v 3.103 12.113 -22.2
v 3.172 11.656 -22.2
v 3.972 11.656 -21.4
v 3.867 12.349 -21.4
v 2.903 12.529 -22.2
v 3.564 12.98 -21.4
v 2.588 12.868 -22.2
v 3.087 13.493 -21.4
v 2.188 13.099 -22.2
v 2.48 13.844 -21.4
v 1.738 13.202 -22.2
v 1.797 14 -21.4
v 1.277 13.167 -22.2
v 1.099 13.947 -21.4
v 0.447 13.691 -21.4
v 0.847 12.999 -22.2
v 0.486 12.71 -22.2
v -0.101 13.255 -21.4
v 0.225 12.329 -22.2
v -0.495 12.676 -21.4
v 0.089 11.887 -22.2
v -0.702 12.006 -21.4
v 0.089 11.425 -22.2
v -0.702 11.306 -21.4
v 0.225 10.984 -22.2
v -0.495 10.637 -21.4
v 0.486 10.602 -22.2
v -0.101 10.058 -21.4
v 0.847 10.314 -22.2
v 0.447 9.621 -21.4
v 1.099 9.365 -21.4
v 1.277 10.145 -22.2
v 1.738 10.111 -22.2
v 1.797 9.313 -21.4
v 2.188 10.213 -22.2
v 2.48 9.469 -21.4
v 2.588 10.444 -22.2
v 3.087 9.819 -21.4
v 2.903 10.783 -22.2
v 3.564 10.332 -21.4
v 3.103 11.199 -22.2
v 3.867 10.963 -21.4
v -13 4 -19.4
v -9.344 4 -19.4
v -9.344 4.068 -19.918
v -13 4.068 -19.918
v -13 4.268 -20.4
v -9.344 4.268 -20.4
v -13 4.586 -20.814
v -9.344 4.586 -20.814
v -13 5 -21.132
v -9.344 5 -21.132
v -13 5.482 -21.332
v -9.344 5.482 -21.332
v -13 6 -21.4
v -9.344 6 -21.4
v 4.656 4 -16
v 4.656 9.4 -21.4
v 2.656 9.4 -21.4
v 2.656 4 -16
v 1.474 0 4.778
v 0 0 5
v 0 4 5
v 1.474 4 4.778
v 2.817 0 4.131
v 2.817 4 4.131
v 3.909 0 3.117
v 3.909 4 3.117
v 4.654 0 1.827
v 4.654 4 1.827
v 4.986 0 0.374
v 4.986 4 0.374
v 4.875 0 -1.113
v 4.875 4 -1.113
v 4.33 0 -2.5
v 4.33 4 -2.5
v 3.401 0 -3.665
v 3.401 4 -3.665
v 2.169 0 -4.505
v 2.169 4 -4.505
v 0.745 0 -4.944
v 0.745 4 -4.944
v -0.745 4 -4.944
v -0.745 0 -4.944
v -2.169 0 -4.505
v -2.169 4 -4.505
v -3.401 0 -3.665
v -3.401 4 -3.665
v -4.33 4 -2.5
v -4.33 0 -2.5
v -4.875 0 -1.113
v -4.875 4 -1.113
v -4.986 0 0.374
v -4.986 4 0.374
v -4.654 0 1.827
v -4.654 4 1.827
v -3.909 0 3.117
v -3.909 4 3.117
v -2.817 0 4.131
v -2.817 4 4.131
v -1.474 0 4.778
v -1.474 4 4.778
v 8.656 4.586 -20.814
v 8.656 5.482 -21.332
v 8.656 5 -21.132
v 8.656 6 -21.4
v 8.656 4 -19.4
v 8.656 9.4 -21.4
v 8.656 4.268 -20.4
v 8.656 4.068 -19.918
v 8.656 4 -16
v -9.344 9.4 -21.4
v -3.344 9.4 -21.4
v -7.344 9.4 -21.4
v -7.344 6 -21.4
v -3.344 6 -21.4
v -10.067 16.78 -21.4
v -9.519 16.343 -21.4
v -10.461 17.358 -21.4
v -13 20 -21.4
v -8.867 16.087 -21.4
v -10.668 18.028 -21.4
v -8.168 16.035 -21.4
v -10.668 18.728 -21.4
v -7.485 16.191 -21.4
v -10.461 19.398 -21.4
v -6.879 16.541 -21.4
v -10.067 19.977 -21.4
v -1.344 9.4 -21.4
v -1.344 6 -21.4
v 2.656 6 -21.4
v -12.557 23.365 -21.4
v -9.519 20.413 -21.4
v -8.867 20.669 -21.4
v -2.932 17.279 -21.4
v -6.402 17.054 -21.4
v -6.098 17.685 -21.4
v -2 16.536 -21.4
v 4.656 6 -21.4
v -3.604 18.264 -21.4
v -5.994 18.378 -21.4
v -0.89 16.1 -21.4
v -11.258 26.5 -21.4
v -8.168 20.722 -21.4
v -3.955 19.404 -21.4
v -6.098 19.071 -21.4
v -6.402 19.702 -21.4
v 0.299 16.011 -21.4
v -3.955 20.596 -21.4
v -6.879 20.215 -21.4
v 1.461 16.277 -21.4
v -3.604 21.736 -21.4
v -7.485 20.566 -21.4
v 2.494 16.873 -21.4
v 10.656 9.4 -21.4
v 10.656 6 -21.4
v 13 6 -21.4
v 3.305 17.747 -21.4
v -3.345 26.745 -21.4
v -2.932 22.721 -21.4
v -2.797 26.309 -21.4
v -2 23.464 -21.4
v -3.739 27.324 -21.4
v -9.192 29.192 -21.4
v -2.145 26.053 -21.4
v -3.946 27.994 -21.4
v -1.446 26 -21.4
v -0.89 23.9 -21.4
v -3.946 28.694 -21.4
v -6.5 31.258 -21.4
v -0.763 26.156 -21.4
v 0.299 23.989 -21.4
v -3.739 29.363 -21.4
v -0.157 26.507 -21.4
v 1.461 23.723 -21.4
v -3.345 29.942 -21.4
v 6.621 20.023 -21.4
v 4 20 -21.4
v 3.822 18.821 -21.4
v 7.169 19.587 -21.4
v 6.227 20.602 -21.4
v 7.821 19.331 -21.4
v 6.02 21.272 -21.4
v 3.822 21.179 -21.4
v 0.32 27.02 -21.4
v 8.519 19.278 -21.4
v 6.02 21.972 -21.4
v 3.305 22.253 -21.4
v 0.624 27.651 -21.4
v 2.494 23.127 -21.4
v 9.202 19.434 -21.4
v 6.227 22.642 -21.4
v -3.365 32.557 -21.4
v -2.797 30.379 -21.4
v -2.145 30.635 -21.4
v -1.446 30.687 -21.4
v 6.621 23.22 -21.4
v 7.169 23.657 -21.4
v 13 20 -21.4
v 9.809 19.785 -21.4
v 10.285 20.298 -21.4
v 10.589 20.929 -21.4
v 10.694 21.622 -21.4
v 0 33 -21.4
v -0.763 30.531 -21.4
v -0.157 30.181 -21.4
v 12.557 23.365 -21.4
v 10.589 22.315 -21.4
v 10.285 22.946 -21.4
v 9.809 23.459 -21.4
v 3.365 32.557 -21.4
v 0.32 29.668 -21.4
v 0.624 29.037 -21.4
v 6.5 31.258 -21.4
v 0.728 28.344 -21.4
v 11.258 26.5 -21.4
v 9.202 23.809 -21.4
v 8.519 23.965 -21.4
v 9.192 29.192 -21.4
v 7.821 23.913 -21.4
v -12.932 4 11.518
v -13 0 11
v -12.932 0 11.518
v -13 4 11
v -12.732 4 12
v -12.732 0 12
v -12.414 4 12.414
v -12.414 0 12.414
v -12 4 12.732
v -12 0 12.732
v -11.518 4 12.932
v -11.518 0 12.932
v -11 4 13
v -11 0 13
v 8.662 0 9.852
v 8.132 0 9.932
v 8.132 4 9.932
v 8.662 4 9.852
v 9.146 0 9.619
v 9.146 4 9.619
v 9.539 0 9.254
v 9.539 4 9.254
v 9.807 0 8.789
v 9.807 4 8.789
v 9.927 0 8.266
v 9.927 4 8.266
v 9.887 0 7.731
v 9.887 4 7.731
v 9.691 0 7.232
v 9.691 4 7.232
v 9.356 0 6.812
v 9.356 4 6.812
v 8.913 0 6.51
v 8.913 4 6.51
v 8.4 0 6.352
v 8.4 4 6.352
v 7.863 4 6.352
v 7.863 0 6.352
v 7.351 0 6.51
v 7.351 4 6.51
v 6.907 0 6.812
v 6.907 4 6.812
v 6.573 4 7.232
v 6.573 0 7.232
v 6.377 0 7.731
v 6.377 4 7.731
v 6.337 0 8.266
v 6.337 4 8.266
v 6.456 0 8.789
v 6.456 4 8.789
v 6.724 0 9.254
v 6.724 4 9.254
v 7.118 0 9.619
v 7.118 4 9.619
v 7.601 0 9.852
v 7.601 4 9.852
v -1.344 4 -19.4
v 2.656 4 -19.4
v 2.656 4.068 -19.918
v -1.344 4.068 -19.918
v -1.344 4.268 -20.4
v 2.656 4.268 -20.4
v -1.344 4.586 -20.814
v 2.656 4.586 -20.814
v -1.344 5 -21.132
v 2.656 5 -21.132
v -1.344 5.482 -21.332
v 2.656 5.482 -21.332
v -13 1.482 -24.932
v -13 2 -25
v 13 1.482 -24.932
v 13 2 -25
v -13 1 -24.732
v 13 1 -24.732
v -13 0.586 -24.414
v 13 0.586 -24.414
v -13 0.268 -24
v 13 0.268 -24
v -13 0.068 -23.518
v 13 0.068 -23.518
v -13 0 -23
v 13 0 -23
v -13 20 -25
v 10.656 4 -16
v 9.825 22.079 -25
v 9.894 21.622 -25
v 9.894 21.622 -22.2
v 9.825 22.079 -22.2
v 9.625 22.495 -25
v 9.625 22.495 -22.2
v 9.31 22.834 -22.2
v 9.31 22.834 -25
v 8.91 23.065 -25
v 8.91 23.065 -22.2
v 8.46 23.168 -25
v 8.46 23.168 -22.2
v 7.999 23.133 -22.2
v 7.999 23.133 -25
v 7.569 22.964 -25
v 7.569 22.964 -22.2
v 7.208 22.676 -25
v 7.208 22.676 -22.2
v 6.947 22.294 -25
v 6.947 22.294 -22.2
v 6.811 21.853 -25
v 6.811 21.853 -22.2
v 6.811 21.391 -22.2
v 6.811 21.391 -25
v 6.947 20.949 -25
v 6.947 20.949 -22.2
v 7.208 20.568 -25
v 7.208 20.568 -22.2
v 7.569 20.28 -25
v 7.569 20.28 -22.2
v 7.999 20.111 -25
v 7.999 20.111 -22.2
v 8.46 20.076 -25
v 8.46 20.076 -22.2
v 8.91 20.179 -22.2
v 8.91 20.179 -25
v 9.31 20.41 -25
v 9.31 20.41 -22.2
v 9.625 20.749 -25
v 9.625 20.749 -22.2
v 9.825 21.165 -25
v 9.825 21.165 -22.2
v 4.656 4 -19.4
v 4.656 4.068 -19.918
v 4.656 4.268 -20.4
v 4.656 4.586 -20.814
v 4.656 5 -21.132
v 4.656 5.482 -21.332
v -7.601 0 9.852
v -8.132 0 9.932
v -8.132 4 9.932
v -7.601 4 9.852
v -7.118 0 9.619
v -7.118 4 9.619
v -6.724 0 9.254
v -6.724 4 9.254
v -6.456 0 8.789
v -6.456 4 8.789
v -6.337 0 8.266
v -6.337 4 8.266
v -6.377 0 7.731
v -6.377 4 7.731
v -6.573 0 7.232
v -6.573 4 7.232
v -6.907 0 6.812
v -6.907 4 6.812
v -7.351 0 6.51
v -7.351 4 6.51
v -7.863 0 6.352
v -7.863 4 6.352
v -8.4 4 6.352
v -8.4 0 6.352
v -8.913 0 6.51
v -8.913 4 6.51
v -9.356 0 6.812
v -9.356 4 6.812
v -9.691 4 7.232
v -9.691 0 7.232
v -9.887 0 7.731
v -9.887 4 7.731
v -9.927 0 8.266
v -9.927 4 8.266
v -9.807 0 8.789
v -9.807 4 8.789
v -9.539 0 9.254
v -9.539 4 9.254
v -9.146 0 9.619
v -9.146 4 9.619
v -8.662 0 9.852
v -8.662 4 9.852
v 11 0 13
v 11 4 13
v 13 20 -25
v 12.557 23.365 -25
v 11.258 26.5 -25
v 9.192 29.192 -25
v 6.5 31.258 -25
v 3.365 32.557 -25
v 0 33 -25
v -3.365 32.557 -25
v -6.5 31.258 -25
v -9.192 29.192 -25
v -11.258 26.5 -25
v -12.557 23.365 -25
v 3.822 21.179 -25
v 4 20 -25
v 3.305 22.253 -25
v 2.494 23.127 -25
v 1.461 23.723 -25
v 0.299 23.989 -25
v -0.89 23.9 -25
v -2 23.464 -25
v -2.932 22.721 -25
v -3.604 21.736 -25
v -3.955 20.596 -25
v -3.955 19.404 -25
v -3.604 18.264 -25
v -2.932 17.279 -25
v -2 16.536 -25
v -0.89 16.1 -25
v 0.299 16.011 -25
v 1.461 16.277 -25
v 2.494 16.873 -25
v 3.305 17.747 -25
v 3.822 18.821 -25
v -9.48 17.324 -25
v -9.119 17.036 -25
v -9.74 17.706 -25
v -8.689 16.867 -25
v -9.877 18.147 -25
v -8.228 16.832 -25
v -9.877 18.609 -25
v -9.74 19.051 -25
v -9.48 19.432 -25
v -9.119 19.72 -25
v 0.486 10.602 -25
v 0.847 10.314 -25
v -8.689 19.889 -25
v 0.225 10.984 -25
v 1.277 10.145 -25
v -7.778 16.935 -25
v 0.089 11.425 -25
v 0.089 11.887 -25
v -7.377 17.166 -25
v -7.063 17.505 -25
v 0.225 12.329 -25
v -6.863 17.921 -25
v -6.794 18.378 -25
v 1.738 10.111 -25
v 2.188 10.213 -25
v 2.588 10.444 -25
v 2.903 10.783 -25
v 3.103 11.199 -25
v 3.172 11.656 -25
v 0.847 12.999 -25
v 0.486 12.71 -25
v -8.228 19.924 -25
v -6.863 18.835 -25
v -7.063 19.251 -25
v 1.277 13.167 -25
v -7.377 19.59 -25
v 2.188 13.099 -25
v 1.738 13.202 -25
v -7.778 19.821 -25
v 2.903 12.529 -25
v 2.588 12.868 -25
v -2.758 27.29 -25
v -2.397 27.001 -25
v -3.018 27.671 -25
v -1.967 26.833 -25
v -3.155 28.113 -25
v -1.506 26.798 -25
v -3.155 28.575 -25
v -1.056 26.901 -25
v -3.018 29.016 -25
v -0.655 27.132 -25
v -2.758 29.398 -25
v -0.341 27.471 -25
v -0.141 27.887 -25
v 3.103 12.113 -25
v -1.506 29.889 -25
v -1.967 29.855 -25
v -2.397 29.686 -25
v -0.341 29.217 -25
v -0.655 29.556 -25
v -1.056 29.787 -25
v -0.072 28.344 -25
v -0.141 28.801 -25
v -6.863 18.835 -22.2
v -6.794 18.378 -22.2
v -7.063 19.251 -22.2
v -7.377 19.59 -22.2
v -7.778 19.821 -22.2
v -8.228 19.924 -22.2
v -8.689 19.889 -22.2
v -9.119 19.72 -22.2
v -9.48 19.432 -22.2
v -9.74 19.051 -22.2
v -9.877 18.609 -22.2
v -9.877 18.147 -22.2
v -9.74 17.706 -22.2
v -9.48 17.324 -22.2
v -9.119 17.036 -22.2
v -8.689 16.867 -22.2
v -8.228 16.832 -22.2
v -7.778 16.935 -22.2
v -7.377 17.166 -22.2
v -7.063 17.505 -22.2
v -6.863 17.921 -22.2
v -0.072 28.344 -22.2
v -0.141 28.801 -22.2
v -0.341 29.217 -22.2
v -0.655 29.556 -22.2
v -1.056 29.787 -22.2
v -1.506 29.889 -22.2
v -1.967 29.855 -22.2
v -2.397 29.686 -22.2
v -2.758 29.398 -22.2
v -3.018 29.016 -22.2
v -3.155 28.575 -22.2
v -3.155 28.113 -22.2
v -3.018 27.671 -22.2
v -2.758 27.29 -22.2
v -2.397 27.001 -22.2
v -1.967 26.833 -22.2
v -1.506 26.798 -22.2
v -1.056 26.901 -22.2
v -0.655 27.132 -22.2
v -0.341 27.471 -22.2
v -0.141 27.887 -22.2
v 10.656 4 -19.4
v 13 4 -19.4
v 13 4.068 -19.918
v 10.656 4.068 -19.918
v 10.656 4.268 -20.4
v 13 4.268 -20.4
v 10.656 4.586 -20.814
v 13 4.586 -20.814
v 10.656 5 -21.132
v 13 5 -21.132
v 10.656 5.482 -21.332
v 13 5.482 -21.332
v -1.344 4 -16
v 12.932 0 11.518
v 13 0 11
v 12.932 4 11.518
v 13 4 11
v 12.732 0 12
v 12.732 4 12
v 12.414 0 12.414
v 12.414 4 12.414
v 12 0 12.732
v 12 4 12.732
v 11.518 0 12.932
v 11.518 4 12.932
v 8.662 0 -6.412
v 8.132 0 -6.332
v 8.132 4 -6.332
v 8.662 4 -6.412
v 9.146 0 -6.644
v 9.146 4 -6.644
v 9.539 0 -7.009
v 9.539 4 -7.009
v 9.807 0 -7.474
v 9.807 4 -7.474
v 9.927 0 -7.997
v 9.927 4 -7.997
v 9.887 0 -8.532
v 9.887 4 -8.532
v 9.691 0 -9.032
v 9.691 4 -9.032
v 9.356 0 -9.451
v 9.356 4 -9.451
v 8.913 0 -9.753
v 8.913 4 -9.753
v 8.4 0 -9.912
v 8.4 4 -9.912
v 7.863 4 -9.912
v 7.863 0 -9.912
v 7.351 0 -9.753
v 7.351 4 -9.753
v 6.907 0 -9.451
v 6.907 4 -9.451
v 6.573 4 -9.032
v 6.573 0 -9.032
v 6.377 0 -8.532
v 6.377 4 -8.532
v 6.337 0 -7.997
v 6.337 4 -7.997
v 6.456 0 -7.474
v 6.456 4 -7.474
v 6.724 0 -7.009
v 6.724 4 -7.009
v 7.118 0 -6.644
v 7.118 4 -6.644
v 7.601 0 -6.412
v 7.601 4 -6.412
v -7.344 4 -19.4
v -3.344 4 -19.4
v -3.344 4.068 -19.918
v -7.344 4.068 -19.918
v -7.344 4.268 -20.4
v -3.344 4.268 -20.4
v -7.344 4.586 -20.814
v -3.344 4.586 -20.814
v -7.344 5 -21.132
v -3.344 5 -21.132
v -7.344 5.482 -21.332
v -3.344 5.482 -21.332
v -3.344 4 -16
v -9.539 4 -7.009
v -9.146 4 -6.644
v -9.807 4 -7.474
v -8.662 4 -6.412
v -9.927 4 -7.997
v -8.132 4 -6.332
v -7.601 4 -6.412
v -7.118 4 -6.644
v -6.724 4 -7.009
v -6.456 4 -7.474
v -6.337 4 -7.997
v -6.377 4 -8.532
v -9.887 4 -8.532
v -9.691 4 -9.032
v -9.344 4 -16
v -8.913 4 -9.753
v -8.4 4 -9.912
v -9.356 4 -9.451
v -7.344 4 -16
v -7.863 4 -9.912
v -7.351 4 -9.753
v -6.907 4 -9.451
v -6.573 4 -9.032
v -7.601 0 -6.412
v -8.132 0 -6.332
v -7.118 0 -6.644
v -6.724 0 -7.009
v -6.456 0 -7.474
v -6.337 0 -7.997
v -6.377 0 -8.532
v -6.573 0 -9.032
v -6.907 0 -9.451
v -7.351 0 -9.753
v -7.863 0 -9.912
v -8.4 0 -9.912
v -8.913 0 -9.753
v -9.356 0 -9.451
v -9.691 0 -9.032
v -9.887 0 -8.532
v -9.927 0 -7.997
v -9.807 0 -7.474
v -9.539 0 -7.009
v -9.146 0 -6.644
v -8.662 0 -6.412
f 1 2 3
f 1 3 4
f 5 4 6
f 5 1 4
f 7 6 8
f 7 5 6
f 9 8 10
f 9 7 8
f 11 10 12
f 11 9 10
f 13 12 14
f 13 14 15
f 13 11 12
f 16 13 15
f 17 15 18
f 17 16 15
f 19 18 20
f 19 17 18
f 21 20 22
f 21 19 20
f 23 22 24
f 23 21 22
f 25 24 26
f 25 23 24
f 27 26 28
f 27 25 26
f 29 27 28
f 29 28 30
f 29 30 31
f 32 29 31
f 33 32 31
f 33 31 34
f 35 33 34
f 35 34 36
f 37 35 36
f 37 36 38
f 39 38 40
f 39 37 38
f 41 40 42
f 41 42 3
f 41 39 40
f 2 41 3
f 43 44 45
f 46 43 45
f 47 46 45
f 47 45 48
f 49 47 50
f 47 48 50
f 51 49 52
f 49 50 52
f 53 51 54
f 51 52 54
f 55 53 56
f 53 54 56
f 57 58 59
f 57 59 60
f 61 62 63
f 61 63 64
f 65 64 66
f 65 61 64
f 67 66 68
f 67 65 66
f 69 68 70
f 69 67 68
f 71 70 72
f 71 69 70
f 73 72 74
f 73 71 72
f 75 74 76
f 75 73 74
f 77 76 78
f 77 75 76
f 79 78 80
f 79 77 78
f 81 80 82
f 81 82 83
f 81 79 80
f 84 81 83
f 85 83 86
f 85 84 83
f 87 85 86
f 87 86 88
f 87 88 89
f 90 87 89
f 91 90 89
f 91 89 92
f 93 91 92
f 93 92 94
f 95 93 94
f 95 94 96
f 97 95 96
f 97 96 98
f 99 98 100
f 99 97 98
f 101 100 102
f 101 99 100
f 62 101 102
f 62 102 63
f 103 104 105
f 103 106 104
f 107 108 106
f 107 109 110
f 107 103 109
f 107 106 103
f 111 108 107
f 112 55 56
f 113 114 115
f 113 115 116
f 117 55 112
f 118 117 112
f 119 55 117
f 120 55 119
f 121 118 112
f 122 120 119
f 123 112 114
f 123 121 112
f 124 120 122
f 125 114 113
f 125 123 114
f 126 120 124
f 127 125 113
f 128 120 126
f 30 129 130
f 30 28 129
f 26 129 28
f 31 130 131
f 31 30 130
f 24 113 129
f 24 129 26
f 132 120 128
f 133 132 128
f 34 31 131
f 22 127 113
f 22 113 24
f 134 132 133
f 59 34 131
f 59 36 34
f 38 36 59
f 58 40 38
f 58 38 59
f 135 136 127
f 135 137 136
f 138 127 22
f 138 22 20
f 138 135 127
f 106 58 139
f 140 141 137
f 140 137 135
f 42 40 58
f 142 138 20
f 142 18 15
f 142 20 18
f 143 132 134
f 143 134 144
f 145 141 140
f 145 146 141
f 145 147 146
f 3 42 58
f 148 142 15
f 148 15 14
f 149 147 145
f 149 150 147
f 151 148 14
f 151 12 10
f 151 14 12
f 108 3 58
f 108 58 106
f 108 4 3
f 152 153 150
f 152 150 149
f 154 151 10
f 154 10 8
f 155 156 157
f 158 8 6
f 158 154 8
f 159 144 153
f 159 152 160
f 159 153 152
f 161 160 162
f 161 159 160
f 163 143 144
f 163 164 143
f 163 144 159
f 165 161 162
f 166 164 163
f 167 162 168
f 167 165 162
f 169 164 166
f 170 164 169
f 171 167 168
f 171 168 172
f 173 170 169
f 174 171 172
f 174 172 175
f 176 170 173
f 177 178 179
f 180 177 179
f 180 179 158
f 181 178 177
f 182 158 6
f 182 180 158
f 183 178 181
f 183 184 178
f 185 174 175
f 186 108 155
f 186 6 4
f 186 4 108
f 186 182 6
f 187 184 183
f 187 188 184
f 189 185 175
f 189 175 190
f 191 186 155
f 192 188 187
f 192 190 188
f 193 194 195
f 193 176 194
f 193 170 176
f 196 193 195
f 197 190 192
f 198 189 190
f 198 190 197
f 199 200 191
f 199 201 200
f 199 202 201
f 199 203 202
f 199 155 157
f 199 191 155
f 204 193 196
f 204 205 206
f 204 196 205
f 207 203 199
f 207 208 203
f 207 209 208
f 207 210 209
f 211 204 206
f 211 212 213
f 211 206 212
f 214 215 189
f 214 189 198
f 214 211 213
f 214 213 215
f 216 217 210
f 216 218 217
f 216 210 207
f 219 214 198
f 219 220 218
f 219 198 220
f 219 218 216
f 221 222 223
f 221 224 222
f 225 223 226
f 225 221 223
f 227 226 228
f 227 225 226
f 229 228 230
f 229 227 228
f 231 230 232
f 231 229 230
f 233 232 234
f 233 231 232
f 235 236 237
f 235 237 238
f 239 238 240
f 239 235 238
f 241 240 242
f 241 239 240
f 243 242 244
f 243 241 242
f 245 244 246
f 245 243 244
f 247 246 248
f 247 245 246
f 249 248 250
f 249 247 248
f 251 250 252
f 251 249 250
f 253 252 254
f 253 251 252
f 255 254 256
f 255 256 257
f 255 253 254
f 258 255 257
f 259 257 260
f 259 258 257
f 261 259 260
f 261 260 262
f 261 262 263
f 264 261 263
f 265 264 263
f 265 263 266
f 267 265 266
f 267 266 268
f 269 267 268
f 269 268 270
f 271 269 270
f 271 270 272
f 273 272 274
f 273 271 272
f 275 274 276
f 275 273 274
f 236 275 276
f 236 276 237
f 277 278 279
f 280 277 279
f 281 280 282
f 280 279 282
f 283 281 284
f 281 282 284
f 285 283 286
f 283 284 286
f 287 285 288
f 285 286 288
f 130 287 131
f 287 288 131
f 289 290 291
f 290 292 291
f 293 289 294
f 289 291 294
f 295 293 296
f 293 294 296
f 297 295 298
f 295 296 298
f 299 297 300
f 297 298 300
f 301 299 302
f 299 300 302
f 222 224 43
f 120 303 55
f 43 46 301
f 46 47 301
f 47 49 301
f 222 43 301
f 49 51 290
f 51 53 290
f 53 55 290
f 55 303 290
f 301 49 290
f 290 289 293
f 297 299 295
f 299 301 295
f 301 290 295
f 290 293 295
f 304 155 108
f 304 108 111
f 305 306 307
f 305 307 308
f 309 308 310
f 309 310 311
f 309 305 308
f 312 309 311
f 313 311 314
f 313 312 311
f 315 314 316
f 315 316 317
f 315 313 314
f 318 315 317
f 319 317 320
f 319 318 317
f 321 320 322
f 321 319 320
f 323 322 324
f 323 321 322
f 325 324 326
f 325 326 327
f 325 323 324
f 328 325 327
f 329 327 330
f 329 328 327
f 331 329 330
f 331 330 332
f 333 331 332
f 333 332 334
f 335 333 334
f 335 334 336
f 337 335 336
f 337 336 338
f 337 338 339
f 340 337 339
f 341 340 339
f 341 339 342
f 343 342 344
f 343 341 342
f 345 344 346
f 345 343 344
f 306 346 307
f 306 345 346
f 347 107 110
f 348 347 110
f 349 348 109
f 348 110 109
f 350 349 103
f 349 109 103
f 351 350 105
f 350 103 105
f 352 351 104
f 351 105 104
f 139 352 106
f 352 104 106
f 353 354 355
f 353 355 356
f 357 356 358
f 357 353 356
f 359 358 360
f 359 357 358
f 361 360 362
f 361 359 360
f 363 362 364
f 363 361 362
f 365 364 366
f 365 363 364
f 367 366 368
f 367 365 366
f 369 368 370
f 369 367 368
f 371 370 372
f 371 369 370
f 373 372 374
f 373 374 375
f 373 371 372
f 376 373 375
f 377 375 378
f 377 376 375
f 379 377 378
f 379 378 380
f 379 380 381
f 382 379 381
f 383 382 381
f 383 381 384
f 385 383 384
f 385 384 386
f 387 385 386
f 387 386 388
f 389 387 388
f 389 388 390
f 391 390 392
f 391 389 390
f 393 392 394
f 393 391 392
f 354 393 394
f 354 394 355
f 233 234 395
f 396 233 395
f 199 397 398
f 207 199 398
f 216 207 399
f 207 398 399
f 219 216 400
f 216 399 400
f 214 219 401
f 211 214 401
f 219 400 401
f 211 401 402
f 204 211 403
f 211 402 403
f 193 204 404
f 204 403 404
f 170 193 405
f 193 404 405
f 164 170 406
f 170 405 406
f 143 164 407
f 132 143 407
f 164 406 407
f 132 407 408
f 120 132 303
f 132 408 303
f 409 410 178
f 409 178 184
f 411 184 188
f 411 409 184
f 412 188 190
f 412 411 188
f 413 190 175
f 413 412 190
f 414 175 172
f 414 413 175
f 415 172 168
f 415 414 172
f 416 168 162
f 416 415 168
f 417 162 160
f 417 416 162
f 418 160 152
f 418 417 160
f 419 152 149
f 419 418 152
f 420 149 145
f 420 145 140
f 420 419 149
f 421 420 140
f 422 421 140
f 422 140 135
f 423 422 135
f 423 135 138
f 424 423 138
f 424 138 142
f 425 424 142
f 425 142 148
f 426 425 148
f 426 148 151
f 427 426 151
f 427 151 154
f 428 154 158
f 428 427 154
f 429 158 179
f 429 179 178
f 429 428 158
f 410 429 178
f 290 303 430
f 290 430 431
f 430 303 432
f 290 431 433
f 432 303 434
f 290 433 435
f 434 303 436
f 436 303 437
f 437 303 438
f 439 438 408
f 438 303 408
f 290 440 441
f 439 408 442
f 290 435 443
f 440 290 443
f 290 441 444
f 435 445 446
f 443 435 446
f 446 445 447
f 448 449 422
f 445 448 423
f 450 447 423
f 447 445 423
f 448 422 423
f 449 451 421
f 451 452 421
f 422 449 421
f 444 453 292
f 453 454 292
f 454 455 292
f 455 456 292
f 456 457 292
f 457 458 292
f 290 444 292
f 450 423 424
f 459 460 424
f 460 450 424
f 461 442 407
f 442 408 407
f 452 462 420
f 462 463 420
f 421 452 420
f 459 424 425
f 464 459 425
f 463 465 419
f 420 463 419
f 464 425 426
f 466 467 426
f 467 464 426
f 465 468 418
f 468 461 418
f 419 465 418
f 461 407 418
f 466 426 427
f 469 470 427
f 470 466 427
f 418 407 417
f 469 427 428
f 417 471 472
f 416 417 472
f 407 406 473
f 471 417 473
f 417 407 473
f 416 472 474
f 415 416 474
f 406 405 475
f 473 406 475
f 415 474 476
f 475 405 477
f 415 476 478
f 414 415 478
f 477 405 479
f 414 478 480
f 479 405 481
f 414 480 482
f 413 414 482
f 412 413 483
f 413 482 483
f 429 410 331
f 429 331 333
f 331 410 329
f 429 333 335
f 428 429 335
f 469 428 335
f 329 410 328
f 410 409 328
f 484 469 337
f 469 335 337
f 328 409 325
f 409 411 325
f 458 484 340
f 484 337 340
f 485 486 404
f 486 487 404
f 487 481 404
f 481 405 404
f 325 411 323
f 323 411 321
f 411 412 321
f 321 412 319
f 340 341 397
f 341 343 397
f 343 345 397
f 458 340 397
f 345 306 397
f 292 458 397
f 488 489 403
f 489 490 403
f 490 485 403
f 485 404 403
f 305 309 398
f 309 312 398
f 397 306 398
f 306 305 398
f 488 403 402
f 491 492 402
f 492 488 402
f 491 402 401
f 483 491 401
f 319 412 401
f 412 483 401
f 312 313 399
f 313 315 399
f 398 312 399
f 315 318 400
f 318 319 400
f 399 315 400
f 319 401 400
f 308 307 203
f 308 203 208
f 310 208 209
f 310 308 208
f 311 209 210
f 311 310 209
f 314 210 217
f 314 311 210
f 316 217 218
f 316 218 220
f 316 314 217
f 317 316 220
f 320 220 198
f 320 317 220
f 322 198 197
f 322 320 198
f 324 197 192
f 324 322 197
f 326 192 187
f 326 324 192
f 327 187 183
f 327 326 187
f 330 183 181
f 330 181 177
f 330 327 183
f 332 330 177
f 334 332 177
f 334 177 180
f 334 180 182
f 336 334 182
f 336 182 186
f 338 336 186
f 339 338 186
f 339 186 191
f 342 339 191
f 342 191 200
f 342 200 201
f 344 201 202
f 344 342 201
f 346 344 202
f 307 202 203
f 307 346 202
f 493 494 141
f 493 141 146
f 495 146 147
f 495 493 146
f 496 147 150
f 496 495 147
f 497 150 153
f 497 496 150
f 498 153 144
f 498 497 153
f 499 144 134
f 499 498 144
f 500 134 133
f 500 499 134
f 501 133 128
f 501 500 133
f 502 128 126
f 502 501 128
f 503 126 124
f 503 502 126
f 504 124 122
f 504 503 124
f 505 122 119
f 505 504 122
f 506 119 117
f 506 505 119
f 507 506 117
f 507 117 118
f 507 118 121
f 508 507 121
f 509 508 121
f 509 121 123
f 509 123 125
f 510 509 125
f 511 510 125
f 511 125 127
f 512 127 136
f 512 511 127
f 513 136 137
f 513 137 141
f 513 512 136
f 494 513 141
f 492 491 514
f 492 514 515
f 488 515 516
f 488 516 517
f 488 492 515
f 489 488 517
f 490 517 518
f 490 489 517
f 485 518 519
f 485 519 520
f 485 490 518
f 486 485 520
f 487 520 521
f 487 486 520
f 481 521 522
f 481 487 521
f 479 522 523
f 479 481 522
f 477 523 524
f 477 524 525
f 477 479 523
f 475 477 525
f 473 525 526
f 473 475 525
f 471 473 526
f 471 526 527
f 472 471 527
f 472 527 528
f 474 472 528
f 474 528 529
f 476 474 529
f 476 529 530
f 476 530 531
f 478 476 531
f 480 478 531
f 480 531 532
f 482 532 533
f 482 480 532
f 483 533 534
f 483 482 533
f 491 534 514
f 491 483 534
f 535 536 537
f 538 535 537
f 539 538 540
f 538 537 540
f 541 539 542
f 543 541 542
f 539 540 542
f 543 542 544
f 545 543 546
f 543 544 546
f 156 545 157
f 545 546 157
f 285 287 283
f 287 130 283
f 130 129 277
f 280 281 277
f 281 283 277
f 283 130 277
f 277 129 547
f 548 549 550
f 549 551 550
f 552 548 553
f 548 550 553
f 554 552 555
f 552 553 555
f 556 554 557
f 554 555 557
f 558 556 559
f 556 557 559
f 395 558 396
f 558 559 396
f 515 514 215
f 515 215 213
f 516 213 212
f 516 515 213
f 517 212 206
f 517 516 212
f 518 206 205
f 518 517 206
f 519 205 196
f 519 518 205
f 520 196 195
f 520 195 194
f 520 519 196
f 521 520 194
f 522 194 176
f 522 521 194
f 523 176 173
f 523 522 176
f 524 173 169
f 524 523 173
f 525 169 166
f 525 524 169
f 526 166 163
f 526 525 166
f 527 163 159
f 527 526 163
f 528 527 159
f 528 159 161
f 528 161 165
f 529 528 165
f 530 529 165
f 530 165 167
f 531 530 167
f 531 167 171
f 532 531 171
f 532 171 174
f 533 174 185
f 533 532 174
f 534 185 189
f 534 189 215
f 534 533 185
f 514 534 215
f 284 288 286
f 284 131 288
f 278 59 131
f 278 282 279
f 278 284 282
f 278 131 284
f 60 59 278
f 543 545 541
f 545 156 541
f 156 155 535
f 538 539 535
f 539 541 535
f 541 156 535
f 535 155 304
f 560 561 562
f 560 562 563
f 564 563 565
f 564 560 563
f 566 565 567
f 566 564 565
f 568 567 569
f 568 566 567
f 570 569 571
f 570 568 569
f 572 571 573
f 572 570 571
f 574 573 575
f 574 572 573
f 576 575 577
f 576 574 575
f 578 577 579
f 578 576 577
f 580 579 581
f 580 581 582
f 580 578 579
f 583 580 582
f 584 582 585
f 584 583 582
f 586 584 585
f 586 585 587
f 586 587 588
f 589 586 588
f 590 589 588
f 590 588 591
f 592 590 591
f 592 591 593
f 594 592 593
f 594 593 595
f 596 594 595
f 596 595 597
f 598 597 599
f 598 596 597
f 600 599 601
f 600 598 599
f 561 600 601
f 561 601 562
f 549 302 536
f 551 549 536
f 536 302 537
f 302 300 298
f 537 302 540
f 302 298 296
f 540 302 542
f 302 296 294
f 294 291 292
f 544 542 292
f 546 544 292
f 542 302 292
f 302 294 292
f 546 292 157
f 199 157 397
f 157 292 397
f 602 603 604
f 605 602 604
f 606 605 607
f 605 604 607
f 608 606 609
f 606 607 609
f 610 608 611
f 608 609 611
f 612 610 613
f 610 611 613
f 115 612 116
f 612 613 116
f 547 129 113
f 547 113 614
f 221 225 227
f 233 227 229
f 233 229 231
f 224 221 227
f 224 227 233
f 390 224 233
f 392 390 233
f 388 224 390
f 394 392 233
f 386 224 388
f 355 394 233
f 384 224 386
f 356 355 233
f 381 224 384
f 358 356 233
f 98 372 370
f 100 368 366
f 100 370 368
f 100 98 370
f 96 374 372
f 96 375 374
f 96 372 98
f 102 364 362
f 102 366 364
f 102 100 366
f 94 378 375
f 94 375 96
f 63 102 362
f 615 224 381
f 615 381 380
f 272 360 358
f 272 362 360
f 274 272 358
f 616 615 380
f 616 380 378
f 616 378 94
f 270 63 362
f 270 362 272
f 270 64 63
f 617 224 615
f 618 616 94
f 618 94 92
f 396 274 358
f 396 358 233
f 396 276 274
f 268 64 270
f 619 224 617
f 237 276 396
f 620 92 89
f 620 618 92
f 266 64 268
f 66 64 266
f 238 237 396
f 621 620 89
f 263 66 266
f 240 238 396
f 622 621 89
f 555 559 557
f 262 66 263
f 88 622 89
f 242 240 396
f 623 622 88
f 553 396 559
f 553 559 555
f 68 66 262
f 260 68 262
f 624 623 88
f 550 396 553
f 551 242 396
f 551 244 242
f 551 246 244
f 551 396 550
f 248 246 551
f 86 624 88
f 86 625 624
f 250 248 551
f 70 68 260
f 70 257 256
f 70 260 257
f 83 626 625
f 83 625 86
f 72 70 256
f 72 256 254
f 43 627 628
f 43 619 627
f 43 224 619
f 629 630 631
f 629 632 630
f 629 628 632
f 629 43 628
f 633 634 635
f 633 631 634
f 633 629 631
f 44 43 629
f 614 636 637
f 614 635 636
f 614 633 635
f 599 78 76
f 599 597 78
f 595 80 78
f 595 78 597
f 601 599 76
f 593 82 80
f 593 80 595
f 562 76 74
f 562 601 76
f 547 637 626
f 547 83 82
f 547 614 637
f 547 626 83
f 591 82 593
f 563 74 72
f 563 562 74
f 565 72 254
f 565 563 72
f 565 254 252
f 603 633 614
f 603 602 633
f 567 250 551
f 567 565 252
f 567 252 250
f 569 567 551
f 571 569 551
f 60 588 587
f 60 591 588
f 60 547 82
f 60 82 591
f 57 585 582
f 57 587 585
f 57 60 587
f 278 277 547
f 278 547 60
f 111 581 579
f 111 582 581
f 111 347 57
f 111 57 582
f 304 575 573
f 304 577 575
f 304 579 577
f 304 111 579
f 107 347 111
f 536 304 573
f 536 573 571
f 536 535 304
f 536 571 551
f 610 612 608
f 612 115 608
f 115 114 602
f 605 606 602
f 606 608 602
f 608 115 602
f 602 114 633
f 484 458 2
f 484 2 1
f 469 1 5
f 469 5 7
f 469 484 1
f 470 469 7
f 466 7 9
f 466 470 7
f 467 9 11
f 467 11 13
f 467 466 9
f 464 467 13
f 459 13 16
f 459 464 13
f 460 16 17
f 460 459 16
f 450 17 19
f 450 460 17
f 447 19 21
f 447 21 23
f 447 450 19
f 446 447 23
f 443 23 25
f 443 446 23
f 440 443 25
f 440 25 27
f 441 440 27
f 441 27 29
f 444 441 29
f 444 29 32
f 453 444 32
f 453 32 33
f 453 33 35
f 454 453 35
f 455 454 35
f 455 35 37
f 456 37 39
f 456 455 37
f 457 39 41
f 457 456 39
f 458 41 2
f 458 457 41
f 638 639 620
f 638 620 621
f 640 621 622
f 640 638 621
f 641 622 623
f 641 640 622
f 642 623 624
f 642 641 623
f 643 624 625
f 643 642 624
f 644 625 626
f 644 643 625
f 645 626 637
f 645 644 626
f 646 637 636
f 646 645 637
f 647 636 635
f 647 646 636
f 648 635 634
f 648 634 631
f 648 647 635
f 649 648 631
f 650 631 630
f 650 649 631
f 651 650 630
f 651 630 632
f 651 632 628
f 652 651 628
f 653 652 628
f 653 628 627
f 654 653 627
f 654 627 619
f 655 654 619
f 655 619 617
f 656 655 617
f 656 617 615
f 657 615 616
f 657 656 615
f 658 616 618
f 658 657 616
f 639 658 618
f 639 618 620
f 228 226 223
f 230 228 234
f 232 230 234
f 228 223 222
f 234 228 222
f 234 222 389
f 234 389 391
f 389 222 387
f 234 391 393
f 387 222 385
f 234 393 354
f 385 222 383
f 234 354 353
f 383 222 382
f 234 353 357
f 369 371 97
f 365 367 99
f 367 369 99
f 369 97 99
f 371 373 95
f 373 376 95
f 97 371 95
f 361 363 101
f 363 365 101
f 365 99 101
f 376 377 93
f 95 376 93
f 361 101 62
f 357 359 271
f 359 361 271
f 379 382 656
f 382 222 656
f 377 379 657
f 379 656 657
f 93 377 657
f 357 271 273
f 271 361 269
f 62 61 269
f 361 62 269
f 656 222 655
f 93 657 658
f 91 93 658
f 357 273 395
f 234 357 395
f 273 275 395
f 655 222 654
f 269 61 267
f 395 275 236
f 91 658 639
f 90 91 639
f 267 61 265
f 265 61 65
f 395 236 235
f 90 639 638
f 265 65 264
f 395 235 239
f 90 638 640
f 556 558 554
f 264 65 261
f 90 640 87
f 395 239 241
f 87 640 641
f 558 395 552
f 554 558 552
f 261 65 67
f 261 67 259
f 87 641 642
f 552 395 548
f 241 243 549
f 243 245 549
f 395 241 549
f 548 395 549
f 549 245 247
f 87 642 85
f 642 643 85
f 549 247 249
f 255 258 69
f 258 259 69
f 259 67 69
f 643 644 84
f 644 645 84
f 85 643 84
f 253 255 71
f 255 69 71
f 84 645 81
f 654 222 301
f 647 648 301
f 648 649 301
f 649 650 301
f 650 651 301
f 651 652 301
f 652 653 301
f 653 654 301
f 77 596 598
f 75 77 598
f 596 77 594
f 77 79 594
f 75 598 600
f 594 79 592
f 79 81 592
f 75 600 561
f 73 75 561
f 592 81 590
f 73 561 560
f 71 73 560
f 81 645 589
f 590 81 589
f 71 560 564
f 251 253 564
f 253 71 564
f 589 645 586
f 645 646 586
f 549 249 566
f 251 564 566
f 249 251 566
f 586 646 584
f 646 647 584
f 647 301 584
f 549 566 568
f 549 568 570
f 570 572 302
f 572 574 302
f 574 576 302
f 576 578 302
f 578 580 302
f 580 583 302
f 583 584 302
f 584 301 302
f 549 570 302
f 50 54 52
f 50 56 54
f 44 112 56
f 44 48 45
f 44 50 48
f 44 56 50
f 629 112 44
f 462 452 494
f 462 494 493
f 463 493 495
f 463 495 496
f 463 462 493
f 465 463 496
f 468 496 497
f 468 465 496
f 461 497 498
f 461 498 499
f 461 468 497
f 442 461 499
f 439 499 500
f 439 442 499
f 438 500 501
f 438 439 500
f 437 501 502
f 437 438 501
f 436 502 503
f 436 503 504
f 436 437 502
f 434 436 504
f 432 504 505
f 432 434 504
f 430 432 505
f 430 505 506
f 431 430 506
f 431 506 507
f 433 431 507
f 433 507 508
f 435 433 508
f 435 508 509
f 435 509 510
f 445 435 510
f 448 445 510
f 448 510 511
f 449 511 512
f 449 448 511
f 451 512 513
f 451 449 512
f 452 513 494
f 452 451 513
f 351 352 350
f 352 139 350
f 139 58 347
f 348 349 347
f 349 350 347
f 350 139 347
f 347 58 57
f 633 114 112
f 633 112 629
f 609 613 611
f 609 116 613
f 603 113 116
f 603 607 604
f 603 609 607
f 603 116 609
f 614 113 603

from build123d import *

# Parameters (mm, degrees)
SKETCH_2_W             = 26
SKETCH_2_H             = 38
SKETCH_2_R             = 1.8
SKETCH_2_R_2           = 5
EXTRUDE_1_DEPTH        = 4
EXTRUDE_START          = -25
SKETCH_3_R             = 4
SKETCH_3_R_2           = 1.55
EXTRUDE_2_DEPTH        = 3.6
FILLET_1_R             = 2
RIB_1_REACH            = 48.579
SKETCH_4_WALL_W        = 112.976143744
SKETCH_4_WALL_H        = 2
PATTERN_LINEAR_1_COUNT = 4
PATTERN_LINEAR_1_PITCH = 6
CHAMFER_1_SIZE         = 0.8


with BuildPart() as part:
    # 草图2 → 凸台-拉伸1 (new body)
    with BuildSketch(Plane(origin=(0, 0, 0), x_dir=(1, 0, 0), z_dir=(0, 1, 0))):
        with Locations((0, 6)):
            Rectangle(SKETCH_2_W, SKETCH_2_H)
        with Locations(Location((-8.131727984, 8.131727984, 0), (0, 0, 270))):
            Circle(SKETCH_2_R, mode=Mode.SUBTRACT)
        with Locations(Location((8.131727984, 8.131727984, 0), (0, 0, 270))):
            Circle(SKETCH_2_R, mode=Mode.SUBTRACT)
        with Locations(Location((8.131727984, -8.131727984, 0), (0, 0, 270))):
            Circle(SKETCH_2_R, mode=Mode.SUBTRACT)
        with Locations(Location((-8.131727984, -8.131727984, 0), (0, 0, 270))):
            Circle(SKETCH_2_R, mode=Mode.SUBTRACT)
        with Locations(Location((0, 0, 0), (0, 0, 270))):
            Circle(SKETCH_2_R_2, mode=Mode.SUBTRACT)
    extrude(amount=EXTRUDE_1_DEPTH)

    # 草图3 → 凸台-拉伸2 (add)
    with BuildSketch(Plane.XY.offset(EXTRUDE_START)):
        with BuildLine():
            Line((-13, 20), (-13, 4))
            Line((-13, 4), (13, 4))
            Line((13, 4), (13, 20))
            ThreePointArc((13, 20), (0, 33), (-13, 20))
        make_face()
        with Locations((0, 20)):
            Circle(SKETCH_3_R, mode=Mode.SUBTRACT)
        with Locations((-1.621876461, 28.343831059)):
            Circle(SKETCH_3_R_2, mode=Mode.SUBTRACT)
        with Locations((8.343831059, 21.621876461)):
            Circle(SKETCH_3_R_2, mode=Mode.SUBTRACT)
        with Locations((1.621876461, 11.656168941)):
            Circle(SKETCH_3_R_2, mode=Mode.SUBTRACT)
        with Locations((-8.343831059, 18.378123539)):
            Circle(SKETCH_3_R_2, mode=Mode.SUBTRACT)
    extrude(amount=EXTRUDE_2_DEPTH)

    # 圆角1
    fillet_1_edges = [part.edges().sort_by_distance(p)[0] for p in [
        (0, 4, -21.4),
        (0, 0, -25),
        (13, 2, 13),
        (-13, 2, 13),
    ]]
    fillet(fillet_1_edges, radius=FILLET_1_R)

    # 草图4 wall → 筋1 (add, up to next)
    with BuildSketch(Plane(origin=(-8.343831059, 6.7, -18.7), x_dir=(0, -0.707106781187, 0.707106781187), z_dir=(0, 0.707106781187, 0.707106781187)), mode=Mode.PRIVATE) as rib_1_sk1:
        Rectangle(SKETCH_4_WALL_W, SKETCH_4_WALL_H)
    rib_1_tool1 = extrude(rib_1_sk1.sketch, amount=-RIB_1_REACH, mode=Mode.PRIVATE) - part.part
    rib_1 = rib_1_tool1.solids().sort_by_distance((-8.343831059, 6.7, -18.7))[0]
    add(rib_1)

    # 阵列(线性)1: 筋1 ×4
    with Locations(*[(i * PATTERN_LINEAR_1_PITCH, 0, 0) for i in range(1, PATTERN_LINEAR_1_COUNT)]):
        add(rib_1)

    # 倒角1
    chamfer_1_edges = [part.edges().sort_by_distance(p)[0] for p in [
        (6.793831059, 21.621876461, -21.4),
        (0.071876461, 11.656168941, -21.4),
        (-3.171876461, 28.343831059, -21.4),
        (-9.893831059, 18.378123539, -21.4),
    ]]
    chamfer(chamfer_1_edges, length=CHAMFER_1_SIZE)


solid = part.part
